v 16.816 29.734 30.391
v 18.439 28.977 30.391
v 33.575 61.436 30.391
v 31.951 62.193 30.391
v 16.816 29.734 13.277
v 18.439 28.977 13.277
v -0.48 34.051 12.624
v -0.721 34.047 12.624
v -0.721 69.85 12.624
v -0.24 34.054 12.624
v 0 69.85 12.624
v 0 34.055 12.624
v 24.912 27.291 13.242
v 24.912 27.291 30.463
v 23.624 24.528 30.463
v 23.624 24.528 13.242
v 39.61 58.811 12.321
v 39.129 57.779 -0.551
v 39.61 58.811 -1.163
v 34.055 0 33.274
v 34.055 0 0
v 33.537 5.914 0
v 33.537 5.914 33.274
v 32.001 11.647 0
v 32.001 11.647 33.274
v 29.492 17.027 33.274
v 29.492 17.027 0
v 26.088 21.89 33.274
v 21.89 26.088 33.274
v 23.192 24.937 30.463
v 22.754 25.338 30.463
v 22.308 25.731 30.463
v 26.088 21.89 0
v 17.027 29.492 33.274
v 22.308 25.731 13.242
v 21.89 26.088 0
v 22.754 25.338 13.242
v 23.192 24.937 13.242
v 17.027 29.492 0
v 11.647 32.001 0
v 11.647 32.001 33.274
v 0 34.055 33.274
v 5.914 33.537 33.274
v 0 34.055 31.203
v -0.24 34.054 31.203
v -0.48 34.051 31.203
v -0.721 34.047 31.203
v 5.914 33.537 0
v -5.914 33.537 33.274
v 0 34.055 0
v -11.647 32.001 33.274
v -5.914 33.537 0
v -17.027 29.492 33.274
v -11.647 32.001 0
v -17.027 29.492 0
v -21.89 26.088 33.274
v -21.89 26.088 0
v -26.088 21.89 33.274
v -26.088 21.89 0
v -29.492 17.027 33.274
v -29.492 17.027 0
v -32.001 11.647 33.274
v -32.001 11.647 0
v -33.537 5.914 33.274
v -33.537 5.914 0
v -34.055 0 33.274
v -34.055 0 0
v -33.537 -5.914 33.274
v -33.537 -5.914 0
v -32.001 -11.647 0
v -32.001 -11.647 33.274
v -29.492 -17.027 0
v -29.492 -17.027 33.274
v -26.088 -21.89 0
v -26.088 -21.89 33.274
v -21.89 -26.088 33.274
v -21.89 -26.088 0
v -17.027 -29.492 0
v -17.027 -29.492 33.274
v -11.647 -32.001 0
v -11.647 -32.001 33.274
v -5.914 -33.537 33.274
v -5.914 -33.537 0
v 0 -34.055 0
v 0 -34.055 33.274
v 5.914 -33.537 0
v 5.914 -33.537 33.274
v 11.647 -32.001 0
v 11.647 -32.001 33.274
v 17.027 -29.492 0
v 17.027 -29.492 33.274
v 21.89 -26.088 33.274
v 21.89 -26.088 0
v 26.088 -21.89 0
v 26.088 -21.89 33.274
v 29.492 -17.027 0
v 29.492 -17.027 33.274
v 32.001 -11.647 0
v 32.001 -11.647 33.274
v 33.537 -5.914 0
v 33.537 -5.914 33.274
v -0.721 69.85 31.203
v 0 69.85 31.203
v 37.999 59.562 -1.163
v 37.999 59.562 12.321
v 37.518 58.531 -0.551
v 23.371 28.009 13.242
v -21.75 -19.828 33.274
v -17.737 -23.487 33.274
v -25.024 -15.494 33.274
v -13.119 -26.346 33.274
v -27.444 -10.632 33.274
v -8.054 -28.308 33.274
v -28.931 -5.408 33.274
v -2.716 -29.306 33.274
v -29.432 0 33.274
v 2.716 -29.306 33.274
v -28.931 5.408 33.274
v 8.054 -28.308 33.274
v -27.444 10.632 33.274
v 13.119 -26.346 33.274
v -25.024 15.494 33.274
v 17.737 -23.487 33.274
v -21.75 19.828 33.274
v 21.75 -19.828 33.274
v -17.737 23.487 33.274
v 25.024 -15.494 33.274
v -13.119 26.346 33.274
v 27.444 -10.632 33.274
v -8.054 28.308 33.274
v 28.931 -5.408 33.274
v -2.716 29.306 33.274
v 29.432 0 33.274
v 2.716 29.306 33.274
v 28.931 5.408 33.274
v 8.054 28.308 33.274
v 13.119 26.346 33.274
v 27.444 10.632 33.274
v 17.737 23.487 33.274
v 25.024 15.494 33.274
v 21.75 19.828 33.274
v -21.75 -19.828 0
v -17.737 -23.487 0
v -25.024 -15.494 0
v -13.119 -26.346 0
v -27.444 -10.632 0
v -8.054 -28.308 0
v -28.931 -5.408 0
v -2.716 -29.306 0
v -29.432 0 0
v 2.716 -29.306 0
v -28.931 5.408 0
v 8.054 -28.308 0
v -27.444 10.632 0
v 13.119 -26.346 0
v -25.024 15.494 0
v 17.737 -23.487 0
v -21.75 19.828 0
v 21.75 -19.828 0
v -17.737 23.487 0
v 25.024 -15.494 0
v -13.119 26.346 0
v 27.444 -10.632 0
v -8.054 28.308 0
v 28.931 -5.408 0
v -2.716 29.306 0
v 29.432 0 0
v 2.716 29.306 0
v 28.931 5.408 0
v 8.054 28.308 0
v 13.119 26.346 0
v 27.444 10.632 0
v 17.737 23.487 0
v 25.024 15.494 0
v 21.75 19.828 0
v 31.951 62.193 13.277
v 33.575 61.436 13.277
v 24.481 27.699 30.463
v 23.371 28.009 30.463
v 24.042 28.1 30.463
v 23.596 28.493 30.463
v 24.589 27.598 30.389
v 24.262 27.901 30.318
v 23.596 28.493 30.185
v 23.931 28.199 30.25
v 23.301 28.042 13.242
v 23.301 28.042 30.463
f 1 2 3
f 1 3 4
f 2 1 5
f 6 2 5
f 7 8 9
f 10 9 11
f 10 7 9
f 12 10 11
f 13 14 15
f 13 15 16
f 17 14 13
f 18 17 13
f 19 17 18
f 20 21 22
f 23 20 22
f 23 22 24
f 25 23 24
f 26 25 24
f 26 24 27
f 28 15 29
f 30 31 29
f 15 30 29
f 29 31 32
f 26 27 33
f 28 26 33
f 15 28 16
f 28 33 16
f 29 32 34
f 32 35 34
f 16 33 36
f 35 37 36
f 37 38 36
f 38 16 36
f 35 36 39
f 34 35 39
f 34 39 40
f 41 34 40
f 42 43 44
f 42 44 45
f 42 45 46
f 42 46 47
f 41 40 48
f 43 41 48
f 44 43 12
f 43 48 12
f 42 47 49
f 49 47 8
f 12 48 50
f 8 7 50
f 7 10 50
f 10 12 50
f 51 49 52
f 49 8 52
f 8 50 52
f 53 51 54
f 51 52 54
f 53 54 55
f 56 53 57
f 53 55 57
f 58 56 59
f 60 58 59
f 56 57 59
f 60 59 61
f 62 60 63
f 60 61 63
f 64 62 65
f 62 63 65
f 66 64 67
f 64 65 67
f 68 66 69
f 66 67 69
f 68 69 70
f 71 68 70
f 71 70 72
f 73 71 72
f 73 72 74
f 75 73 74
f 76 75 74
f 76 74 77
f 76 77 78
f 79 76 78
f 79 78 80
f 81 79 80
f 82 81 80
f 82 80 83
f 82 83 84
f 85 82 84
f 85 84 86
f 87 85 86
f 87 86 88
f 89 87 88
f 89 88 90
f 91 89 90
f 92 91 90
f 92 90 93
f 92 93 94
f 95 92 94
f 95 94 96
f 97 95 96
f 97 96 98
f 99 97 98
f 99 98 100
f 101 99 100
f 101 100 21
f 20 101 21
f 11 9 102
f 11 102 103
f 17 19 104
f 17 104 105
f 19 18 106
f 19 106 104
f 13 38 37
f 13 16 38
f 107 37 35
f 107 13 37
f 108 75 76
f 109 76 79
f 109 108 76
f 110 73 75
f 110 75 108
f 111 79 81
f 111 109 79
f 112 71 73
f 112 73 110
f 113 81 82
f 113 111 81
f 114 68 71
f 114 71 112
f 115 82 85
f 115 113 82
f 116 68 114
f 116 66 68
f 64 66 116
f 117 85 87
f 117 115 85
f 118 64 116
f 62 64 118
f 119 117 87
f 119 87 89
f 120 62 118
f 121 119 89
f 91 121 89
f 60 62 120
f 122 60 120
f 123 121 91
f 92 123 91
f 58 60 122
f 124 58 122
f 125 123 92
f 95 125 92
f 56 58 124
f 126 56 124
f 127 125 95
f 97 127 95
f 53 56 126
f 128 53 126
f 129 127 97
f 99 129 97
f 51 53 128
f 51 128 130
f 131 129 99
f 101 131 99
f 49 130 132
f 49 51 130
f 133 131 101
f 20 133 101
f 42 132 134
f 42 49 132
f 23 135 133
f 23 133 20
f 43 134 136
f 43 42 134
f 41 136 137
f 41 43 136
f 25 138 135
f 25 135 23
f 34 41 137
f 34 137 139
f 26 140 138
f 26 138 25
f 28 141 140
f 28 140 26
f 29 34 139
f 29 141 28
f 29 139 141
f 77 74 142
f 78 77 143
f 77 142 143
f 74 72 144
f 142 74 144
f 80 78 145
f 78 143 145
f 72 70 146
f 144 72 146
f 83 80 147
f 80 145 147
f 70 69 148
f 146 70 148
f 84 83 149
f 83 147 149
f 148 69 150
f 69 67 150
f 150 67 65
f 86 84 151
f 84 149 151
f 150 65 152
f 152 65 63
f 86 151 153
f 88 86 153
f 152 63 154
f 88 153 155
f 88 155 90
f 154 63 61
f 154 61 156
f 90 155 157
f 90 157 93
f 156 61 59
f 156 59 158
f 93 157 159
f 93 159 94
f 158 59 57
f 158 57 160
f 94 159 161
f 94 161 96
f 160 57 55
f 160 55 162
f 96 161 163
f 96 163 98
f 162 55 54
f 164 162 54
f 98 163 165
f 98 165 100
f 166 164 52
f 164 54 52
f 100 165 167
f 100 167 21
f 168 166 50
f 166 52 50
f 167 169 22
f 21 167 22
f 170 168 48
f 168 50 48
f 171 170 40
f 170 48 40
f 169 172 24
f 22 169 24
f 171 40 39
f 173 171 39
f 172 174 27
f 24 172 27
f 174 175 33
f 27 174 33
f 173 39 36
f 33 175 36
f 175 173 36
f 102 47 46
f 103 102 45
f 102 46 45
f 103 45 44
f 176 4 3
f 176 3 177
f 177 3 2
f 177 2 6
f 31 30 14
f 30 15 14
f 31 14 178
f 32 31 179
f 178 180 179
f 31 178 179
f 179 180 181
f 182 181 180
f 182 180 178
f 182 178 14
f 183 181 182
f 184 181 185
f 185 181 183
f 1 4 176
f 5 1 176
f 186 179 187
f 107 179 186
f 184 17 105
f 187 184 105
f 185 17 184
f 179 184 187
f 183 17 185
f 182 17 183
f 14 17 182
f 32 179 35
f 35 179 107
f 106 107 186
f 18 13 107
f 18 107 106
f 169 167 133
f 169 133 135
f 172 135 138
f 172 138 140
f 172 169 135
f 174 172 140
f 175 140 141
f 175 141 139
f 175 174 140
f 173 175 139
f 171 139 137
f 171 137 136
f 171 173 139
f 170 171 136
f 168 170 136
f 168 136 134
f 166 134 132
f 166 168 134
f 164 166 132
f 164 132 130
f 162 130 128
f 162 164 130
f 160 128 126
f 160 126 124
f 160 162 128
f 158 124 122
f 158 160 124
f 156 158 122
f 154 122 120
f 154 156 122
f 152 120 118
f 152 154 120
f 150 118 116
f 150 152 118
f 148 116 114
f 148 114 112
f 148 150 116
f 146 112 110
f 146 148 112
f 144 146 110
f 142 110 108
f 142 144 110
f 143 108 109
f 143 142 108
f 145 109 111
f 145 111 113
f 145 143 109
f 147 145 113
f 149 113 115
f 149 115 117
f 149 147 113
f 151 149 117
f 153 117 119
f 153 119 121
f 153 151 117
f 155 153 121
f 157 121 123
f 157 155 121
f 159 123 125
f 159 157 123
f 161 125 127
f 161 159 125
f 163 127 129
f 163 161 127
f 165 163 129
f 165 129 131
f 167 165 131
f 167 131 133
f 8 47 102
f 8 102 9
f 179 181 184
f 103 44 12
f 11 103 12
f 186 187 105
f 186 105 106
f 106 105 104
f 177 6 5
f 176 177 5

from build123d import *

# Parameters (mm, degrees)
SKETCH1_R                  = 34.054831914
SKETCH1_R_2                = 29.431915089
BOSS_EXTRUDE1_DEPTH        = 33.274
SKETCH2_W                  = 0.720665425
SKETCH2_H                  = 18.579229957
BOSS_EXTRUDE2_DEPTH        = 35.814
SKETCH4_W                  = 17.113974723
SKETCH4_H                  = 1.791098965
BOSS_EXTRUDE3_DEPTH        = 35.814
BOSS_EXTRUDE4_REACH        = 92.619
BOSS_EXTRUDE4_START_RADIUS = 34.054831914
BOSS_EXTRUDE4_END_RADIUS   = 34.054831914
SKETCH5_W                  = 17.220704339
SKETCH5_H                  = 1.700810305
BOSS_EXTRUDE5_DEPTH        = 1.778


with BuildPart() as part:
    # Sketch1 → Boss-Extrude1 (new body)
    with BuildSketch(Plane.XY):
        Circle(SKETCH1_R)
        Circle(SKETCH1_R_2, mode=Mode.SUBTRACT)
    extrude(amount=BOSS_EXTRUDE1_DEPTH)

    # Sketch2 → Boss-Extrude2 (add)
    with BuildSketch(Plane(origin=(0, 34.036, 0), x_dir=(1, 0, 0), z_dir=(0, 1, 0))):
        with Locations((-0.360332713, -21.913565349)):
            Rectangle(SKETCH2_W, SKETCH2_H)
    extrude(amount=BOSS_EXTRUDE2_DEPTH)



with BuildPart() as body_2:
    # Sketch4 → Boss-Extrude3 (new body)
    with BuildSketch(Plane(origin=(14.392193867, 30.86415935, 0), x_dir=(0, 0, -1), z_dir=(0.4226182617407033, 0.9063077870366482, 0))):
        with Locations((-21.834219148, -3.569625748)):
            Rectangle(SKETCH4_W, SKETCH4_H)
    extrude(amount=BOSS_EXTRUDE3_DEPTH)


with BuildPart() as body_3:
    # Boss-Extrude4: from a cylinder face, 92.619 long prism both ways, kept between that surface and its translate by the depth
    boss_extrude4_start = Plane(origin=(0, 0, 21.85282), z_dir=(0, 0, -1)) * Cylinder(BOSS_EXTRUDE4_START_RADIUS, 254.347663828, mode=Mode.PRIVATE)
    boss_extrude4_end = Plane(origin=(1.288140462, 2.762426135, 21.85282), z_dir=(0, 0, -1)) * Cylinder(BOSS_EXTRUDE4_END_RADIUS, 254.347663828, mode=Mode.PRIVATE)
    # Sketch5 → Boss-Extrude4 (new, from a surface)
    with BuildSketch(Plane(origin=(14.392193867, 30.86415935, 0), x_dir=(0, 0, -1), z_dir=(0.4226182617407033, 0.9063077870366482, 0)), mode=Mode.PRIVATE) as boss_extrude4_sk1:
        with Locations((-21.852819757, -10.19414928)):
            Rectangle(SKETCH5_W, SKETCH5_H)
    boss_extrude4_tool1 = extrude(boss_extrude4_sk1.sketch, amount=BOSS_EXTRUDE4_REACH, both=True, mode=Mode.PRIVATE)
    add(((boss_extrude4_tool1 - boss_extrude4_start) & boss_extrude4_end).solids().sort_by_distance((23.610178, 26.510778, 21.85282))[0])


with BuildPart() as part_1:
    add(part.part)

    add(body_3.part)  # Boss-Extrude5 merges body 3
    # Sketch6 → Boss-Extrude5 (add)
    with BuildSketch(Plane(origin=(10.009765687, -4.667630396, 0), x_dir=(0, 0, -1), z_dir=(0.9063077870366482, -0.42261826174070344, 0))):
        Polygon((-30.463171926, 35.262117931), (-13.242467587, 35.262117931), (0.550508704, 68.902638998), (1.163427563, 70.040916879), (-12.320787341, 70.040916879), align=None)
    extrude(amount=-BOSS_EXTRUDE5_DEPTH)


solid = Compound([body_2.part, part_1.part])
